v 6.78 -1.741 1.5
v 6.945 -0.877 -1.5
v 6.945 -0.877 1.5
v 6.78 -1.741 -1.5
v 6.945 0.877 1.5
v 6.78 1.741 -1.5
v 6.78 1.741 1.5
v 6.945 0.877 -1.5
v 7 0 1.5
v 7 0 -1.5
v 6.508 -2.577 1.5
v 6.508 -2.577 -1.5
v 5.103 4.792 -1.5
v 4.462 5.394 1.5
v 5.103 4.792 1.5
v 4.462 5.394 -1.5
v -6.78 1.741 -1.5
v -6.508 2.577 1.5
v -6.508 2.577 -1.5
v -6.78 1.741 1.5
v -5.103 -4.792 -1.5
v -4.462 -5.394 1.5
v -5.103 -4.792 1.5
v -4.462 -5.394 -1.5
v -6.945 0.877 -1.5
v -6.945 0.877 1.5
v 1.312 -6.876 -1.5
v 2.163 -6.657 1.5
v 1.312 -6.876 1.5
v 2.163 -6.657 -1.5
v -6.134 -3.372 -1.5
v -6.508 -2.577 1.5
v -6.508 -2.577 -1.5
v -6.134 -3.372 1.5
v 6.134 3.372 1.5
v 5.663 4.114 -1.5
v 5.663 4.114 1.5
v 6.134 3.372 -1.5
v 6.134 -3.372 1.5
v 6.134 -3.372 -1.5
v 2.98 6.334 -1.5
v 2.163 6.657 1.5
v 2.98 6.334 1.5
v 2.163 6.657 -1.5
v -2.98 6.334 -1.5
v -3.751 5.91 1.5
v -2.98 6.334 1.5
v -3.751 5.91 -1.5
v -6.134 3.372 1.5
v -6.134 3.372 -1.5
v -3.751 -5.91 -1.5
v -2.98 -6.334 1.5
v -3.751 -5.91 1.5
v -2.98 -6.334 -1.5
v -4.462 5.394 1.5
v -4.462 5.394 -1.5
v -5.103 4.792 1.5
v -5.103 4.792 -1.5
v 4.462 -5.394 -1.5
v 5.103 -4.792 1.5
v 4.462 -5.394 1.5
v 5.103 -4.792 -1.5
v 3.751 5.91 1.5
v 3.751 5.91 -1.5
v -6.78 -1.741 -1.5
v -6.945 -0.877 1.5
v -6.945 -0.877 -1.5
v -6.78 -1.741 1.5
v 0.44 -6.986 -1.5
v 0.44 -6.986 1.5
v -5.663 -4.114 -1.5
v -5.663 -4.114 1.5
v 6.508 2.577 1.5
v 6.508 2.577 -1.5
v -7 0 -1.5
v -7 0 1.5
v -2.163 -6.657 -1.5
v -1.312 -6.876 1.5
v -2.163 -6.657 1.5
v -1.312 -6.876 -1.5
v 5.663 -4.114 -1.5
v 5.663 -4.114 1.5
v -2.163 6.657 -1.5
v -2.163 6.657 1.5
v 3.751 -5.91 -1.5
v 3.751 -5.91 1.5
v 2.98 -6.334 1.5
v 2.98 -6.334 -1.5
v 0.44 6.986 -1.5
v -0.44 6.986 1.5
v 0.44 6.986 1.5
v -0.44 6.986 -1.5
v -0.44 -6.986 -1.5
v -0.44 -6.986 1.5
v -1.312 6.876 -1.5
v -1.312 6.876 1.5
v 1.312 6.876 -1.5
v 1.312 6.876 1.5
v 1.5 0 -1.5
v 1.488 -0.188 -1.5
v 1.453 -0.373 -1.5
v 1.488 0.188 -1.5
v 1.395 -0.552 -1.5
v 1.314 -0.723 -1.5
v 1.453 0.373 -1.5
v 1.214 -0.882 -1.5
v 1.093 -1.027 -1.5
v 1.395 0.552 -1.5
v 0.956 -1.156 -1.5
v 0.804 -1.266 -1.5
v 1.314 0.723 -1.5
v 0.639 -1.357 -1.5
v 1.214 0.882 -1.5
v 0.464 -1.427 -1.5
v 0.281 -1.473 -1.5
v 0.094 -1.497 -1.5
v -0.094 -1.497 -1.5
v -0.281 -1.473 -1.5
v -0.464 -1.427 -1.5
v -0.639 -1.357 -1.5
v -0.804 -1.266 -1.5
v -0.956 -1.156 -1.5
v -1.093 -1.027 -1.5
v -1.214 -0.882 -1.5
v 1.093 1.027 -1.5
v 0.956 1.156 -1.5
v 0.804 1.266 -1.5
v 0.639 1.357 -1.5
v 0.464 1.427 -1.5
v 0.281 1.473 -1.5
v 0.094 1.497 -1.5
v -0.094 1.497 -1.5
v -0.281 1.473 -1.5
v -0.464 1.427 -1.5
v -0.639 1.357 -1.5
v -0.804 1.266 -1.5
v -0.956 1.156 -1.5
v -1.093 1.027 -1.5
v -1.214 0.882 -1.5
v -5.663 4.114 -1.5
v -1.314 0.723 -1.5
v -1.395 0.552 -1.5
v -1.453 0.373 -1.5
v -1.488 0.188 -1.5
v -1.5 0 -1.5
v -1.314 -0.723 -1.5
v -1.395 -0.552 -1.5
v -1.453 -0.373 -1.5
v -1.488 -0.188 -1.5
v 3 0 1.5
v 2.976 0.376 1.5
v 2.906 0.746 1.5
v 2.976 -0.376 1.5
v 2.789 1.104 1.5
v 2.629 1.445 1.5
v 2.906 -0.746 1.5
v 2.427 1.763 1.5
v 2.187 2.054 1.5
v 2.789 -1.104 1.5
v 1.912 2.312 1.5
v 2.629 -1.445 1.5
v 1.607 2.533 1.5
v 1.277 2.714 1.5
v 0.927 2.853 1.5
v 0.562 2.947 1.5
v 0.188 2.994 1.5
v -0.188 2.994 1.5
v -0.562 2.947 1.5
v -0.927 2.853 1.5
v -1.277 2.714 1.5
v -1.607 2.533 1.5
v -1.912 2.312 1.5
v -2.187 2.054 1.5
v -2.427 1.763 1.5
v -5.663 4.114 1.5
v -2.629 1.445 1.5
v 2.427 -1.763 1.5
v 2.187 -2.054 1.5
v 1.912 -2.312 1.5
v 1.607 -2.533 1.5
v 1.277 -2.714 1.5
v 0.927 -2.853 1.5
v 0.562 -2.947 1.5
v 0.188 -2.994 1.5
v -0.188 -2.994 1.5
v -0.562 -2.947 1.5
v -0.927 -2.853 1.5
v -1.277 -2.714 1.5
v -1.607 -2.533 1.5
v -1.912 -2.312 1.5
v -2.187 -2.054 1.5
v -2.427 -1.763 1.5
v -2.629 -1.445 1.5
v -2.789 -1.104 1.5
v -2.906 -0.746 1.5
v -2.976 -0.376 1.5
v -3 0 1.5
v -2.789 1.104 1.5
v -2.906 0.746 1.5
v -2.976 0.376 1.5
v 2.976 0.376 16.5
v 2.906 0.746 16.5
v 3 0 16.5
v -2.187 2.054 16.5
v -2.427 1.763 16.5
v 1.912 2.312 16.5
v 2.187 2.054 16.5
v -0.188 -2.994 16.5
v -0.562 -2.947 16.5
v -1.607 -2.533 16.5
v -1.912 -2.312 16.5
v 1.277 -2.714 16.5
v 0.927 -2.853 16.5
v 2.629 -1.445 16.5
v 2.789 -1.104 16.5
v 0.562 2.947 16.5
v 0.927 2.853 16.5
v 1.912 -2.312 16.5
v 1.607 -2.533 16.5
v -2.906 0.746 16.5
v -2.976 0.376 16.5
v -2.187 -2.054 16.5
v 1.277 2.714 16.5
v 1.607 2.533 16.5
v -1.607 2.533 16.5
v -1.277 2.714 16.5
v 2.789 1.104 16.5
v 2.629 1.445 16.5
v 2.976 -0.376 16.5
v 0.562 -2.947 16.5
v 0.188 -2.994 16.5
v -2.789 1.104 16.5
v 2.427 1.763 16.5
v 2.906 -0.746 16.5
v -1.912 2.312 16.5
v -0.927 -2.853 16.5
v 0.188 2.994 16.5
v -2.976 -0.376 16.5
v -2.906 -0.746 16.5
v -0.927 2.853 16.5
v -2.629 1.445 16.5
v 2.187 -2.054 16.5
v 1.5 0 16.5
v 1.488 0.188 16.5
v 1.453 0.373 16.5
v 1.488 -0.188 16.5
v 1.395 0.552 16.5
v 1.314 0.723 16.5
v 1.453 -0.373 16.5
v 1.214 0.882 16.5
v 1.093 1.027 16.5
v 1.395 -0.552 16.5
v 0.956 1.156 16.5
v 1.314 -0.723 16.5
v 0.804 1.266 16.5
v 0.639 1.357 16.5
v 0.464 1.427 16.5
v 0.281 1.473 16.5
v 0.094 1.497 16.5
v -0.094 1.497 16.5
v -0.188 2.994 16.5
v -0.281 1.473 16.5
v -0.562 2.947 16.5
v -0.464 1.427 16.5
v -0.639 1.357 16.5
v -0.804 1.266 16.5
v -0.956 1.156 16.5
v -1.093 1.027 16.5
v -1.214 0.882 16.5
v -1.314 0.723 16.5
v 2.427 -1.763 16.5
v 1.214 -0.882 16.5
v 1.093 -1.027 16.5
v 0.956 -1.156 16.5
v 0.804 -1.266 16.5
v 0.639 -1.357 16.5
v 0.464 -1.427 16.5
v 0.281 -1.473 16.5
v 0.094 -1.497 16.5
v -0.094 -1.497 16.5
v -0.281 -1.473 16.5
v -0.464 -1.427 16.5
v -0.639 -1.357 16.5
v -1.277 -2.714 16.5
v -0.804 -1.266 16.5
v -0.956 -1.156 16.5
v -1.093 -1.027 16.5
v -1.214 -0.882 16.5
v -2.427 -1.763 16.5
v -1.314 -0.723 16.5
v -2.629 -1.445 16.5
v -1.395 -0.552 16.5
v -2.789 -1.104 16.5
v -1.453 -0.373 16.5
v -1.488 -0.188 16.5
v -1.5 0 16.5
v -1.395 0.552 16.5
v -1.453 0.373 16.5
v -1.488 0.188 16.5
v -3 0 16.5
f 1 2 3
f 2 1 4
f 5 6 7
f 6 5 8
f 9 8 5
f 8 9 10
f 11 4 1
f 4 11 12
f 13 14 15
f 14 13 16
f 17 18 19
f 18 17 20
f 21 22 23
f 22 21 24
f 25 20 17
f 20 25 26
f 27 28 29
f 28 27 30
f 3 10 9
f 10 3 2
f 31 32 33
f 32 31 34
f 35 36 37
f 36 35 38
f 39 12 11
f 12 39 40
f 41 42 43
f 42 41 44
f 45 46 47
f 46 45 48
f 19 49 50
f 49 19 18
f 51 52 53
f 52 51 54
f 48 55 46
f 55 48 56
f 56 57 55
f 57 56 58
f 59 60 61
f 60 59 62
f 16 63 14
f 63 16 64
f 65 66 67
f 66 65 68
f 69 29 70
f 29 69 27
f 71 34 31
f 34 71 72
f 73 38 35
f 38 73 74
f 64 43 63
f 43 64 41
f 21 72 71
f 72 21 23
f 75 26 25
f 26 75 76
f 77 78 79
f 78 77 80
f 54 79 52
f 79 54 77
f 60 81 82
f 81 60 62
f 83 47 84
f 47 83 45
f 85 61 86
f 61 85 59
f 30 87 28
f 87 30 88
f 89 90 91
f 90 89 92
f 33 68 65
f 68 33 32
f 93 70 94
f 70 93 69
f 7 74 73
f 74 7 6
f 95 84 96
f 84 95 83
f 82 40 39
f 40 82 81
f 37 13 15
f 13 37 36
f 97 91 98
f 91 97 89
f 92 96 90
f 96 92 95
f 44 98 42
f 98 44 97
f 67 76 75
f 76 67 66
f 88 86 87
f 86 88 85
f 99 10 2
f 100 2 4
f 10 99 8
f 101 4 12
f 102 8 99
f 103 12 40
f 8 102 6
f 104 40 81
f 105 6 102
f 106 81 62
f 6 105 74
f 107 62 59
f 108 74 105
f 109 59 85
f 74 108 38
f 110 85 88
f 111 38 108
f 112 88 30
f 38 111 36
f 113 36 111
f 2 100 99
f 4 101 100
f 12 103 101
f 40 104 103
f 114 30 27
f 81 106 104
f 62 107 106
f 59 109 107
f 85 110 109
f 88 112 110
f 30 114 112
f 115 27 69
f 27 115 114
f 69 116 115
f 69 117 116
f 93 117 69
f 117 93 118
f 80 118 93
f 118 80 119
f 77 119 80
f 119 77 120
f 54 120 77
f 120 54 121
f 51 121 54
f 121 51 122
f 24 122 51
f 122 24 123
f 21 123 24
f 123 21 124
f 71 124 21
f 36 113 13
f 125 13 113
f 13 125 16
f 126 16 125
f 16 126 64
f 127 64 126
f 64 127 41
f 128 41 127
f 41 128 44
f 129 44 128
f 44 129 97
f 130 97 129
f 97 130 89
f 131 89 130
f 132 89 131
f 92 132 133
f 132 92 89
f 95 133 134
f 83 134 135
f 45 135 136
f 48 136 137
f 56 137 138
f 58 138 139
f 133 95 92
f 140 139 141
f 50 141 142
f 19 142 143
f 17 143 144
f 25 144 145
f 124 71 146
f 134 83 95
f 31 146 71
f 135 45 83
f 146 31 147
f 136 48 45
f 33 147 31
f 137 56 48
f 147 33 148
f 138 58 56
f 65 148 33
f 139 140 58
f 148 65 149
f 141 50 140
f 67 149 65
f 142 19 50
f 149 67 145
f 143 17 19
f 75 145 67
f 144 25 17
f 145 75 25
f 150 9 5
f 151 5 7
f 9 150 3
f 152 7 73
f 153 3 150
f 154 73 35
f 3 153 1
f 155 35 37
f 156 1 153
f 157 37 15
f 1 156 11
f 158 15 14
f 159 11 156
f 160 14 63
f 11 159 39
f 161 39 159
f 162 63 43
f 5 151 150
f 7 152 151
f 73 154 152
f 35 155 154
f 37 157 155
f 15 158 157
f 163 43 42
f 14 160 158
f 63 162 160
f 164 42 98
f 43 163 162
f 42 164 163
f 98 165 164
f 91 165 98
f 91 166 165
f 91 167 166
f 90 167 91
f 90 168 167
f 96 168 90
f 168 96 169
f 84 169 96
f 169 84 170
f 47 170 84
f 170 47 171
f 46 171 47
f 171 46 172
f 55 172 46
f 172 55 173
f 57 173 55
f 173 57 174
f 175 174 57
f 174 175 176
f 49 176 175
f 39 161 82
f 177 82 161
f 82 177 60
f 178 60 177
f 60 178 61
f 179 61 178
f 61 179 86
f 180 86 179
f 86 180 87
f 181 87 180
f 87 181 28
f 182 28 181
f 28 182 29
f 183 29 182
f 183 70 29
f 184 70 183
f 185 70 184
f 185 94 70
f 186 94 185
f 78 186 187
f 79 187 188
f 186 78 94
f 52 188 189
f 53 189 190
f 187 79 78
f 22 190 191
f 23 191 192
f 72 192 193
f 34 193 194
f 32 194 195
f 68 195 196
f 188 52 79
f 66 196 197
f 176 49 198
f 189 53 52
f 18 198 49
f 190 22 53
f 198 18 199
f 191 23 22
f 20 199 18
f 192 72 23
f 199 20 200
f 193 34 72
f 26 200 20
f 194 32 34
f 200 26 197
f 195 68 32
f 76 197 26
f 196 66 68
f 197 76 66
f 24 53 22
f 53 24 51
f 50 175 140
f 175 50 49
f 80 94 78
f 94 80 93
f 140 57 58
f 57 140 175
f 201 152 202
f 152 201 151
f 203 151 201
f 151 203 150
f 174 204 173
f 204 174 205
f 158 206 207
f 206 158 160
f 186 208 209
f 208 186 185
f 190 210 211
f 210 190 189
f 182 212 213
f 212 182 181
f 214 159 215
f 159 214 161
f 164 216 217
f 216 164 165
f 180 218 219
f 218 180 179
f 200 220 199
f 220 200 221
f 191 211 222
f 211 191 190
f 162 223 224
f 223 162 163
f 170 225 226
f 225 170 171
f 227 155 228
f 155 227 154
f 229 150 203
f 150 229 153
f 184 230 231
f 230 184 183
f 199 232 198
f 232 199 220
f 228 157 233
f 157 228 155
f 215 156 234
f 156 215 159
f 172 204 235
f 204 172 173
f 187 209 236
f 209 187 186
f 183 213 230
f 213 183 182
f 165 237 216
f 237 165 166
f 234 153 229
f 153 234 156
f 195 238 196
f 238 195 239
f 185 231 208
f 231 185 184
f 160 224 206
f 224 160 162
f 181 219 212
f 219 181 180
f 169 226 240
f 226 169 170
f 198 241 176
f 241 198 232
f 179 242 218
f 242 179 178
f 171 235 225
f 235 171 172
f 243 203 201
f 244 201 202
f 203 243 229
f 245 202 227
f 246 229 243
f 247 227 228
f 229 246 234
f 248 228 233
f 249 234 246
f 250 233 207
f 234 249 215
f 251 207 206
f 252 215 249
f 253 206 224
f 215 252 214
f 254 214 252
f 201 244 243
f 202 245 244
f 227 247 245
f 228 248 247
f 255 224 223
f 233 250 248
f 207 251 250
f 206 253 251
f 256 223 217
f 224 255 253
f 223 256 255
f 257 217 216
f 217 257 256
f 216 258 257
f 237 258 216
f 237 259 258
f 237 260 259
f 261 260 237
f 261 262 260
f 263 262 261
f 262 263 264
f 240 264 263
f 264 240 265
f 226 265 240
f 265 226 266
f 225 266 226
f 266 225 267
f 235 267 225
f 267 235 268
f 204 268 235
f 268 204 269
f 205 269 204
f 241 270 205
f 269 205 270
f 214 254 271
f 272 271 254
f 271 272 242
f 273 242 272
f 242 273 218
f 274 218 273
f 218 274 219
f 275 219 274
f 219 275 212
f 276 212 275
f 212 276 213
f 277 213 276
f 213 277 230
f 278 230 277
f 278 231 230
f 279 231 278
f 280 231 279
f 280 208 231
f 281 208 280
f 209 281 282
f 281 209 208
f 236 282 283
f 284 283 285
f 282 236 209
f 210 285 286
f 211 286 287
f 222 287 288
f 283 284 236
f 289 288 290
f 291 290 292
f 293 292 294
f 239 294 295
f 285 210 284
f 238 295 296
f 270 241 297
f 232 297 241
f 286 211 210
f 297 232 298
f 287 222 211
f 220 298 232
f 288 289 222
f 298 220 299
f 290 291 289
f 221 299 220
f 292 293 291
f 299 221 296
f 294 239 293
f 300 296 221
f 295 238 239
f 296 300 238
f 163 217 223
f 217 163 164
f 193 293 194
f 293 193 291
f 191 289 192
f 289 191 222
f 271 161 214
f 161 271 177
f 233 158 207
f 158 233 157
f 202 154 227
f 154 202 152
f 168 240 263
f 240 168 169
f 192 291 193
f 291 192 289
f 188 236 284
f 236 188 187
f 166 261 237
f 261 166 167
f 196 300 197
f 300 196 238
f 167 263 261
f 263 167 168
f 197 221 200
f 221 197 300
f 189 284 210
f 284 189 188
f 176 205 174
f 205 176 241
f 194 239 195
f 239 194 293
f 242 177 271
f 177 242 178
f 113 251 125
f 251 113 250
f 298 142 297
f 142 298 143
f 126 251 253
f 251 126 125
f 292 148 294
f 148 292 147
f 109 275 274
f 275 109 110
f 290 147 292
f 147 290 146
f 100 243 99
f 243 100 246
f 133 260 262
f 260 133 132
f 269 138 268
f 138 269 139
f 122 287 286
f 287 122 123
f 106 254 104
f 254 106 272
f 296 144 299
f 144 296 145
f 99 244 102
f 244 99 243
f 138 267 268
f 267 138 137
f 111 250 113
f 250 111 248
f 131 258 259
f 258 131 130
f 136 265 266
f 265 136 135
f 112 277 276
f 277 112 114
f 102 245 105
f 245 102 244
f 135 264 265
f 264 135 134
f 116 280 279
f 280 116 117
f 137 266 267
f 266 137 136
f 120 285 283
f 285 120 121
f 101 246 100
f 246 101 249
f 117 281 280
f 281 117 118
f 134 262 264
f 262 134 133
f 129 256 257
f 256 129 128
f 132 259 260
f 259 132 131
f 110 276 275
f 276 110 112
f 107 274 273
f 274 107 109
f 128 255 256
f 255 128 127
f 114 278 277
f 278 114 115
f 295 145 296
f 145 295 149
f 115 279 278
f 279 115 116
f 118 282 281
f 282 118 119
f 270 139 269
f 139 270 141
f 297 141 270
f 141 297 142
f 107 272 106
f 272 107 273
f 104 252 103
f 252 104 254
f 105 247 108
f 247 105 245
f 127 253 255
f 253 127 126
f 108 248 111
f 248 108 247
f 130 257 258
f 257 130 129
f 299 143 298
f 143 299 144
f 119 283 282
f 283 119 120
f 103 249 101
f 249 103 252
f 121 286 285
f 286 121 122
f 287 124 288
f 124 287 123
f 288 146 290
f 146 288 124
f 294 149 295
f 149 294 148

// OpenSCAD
$fn = 50;


difference() {
	union() {
		translate(v = [0, 0, -1.5000000000]) {
			cylinder(h = 3, r = 7.0000000000);
		}
		translate(v = [0, 0, -1.5000000000]) {
			cylinder(h = 18, r = 3.0000000000);
		}
	}
	union() {
		translate(v = [0, 0, -50.0000000000]) {
			cylinder(h = 100, r = 1.5000000000);
		}
	}
}
